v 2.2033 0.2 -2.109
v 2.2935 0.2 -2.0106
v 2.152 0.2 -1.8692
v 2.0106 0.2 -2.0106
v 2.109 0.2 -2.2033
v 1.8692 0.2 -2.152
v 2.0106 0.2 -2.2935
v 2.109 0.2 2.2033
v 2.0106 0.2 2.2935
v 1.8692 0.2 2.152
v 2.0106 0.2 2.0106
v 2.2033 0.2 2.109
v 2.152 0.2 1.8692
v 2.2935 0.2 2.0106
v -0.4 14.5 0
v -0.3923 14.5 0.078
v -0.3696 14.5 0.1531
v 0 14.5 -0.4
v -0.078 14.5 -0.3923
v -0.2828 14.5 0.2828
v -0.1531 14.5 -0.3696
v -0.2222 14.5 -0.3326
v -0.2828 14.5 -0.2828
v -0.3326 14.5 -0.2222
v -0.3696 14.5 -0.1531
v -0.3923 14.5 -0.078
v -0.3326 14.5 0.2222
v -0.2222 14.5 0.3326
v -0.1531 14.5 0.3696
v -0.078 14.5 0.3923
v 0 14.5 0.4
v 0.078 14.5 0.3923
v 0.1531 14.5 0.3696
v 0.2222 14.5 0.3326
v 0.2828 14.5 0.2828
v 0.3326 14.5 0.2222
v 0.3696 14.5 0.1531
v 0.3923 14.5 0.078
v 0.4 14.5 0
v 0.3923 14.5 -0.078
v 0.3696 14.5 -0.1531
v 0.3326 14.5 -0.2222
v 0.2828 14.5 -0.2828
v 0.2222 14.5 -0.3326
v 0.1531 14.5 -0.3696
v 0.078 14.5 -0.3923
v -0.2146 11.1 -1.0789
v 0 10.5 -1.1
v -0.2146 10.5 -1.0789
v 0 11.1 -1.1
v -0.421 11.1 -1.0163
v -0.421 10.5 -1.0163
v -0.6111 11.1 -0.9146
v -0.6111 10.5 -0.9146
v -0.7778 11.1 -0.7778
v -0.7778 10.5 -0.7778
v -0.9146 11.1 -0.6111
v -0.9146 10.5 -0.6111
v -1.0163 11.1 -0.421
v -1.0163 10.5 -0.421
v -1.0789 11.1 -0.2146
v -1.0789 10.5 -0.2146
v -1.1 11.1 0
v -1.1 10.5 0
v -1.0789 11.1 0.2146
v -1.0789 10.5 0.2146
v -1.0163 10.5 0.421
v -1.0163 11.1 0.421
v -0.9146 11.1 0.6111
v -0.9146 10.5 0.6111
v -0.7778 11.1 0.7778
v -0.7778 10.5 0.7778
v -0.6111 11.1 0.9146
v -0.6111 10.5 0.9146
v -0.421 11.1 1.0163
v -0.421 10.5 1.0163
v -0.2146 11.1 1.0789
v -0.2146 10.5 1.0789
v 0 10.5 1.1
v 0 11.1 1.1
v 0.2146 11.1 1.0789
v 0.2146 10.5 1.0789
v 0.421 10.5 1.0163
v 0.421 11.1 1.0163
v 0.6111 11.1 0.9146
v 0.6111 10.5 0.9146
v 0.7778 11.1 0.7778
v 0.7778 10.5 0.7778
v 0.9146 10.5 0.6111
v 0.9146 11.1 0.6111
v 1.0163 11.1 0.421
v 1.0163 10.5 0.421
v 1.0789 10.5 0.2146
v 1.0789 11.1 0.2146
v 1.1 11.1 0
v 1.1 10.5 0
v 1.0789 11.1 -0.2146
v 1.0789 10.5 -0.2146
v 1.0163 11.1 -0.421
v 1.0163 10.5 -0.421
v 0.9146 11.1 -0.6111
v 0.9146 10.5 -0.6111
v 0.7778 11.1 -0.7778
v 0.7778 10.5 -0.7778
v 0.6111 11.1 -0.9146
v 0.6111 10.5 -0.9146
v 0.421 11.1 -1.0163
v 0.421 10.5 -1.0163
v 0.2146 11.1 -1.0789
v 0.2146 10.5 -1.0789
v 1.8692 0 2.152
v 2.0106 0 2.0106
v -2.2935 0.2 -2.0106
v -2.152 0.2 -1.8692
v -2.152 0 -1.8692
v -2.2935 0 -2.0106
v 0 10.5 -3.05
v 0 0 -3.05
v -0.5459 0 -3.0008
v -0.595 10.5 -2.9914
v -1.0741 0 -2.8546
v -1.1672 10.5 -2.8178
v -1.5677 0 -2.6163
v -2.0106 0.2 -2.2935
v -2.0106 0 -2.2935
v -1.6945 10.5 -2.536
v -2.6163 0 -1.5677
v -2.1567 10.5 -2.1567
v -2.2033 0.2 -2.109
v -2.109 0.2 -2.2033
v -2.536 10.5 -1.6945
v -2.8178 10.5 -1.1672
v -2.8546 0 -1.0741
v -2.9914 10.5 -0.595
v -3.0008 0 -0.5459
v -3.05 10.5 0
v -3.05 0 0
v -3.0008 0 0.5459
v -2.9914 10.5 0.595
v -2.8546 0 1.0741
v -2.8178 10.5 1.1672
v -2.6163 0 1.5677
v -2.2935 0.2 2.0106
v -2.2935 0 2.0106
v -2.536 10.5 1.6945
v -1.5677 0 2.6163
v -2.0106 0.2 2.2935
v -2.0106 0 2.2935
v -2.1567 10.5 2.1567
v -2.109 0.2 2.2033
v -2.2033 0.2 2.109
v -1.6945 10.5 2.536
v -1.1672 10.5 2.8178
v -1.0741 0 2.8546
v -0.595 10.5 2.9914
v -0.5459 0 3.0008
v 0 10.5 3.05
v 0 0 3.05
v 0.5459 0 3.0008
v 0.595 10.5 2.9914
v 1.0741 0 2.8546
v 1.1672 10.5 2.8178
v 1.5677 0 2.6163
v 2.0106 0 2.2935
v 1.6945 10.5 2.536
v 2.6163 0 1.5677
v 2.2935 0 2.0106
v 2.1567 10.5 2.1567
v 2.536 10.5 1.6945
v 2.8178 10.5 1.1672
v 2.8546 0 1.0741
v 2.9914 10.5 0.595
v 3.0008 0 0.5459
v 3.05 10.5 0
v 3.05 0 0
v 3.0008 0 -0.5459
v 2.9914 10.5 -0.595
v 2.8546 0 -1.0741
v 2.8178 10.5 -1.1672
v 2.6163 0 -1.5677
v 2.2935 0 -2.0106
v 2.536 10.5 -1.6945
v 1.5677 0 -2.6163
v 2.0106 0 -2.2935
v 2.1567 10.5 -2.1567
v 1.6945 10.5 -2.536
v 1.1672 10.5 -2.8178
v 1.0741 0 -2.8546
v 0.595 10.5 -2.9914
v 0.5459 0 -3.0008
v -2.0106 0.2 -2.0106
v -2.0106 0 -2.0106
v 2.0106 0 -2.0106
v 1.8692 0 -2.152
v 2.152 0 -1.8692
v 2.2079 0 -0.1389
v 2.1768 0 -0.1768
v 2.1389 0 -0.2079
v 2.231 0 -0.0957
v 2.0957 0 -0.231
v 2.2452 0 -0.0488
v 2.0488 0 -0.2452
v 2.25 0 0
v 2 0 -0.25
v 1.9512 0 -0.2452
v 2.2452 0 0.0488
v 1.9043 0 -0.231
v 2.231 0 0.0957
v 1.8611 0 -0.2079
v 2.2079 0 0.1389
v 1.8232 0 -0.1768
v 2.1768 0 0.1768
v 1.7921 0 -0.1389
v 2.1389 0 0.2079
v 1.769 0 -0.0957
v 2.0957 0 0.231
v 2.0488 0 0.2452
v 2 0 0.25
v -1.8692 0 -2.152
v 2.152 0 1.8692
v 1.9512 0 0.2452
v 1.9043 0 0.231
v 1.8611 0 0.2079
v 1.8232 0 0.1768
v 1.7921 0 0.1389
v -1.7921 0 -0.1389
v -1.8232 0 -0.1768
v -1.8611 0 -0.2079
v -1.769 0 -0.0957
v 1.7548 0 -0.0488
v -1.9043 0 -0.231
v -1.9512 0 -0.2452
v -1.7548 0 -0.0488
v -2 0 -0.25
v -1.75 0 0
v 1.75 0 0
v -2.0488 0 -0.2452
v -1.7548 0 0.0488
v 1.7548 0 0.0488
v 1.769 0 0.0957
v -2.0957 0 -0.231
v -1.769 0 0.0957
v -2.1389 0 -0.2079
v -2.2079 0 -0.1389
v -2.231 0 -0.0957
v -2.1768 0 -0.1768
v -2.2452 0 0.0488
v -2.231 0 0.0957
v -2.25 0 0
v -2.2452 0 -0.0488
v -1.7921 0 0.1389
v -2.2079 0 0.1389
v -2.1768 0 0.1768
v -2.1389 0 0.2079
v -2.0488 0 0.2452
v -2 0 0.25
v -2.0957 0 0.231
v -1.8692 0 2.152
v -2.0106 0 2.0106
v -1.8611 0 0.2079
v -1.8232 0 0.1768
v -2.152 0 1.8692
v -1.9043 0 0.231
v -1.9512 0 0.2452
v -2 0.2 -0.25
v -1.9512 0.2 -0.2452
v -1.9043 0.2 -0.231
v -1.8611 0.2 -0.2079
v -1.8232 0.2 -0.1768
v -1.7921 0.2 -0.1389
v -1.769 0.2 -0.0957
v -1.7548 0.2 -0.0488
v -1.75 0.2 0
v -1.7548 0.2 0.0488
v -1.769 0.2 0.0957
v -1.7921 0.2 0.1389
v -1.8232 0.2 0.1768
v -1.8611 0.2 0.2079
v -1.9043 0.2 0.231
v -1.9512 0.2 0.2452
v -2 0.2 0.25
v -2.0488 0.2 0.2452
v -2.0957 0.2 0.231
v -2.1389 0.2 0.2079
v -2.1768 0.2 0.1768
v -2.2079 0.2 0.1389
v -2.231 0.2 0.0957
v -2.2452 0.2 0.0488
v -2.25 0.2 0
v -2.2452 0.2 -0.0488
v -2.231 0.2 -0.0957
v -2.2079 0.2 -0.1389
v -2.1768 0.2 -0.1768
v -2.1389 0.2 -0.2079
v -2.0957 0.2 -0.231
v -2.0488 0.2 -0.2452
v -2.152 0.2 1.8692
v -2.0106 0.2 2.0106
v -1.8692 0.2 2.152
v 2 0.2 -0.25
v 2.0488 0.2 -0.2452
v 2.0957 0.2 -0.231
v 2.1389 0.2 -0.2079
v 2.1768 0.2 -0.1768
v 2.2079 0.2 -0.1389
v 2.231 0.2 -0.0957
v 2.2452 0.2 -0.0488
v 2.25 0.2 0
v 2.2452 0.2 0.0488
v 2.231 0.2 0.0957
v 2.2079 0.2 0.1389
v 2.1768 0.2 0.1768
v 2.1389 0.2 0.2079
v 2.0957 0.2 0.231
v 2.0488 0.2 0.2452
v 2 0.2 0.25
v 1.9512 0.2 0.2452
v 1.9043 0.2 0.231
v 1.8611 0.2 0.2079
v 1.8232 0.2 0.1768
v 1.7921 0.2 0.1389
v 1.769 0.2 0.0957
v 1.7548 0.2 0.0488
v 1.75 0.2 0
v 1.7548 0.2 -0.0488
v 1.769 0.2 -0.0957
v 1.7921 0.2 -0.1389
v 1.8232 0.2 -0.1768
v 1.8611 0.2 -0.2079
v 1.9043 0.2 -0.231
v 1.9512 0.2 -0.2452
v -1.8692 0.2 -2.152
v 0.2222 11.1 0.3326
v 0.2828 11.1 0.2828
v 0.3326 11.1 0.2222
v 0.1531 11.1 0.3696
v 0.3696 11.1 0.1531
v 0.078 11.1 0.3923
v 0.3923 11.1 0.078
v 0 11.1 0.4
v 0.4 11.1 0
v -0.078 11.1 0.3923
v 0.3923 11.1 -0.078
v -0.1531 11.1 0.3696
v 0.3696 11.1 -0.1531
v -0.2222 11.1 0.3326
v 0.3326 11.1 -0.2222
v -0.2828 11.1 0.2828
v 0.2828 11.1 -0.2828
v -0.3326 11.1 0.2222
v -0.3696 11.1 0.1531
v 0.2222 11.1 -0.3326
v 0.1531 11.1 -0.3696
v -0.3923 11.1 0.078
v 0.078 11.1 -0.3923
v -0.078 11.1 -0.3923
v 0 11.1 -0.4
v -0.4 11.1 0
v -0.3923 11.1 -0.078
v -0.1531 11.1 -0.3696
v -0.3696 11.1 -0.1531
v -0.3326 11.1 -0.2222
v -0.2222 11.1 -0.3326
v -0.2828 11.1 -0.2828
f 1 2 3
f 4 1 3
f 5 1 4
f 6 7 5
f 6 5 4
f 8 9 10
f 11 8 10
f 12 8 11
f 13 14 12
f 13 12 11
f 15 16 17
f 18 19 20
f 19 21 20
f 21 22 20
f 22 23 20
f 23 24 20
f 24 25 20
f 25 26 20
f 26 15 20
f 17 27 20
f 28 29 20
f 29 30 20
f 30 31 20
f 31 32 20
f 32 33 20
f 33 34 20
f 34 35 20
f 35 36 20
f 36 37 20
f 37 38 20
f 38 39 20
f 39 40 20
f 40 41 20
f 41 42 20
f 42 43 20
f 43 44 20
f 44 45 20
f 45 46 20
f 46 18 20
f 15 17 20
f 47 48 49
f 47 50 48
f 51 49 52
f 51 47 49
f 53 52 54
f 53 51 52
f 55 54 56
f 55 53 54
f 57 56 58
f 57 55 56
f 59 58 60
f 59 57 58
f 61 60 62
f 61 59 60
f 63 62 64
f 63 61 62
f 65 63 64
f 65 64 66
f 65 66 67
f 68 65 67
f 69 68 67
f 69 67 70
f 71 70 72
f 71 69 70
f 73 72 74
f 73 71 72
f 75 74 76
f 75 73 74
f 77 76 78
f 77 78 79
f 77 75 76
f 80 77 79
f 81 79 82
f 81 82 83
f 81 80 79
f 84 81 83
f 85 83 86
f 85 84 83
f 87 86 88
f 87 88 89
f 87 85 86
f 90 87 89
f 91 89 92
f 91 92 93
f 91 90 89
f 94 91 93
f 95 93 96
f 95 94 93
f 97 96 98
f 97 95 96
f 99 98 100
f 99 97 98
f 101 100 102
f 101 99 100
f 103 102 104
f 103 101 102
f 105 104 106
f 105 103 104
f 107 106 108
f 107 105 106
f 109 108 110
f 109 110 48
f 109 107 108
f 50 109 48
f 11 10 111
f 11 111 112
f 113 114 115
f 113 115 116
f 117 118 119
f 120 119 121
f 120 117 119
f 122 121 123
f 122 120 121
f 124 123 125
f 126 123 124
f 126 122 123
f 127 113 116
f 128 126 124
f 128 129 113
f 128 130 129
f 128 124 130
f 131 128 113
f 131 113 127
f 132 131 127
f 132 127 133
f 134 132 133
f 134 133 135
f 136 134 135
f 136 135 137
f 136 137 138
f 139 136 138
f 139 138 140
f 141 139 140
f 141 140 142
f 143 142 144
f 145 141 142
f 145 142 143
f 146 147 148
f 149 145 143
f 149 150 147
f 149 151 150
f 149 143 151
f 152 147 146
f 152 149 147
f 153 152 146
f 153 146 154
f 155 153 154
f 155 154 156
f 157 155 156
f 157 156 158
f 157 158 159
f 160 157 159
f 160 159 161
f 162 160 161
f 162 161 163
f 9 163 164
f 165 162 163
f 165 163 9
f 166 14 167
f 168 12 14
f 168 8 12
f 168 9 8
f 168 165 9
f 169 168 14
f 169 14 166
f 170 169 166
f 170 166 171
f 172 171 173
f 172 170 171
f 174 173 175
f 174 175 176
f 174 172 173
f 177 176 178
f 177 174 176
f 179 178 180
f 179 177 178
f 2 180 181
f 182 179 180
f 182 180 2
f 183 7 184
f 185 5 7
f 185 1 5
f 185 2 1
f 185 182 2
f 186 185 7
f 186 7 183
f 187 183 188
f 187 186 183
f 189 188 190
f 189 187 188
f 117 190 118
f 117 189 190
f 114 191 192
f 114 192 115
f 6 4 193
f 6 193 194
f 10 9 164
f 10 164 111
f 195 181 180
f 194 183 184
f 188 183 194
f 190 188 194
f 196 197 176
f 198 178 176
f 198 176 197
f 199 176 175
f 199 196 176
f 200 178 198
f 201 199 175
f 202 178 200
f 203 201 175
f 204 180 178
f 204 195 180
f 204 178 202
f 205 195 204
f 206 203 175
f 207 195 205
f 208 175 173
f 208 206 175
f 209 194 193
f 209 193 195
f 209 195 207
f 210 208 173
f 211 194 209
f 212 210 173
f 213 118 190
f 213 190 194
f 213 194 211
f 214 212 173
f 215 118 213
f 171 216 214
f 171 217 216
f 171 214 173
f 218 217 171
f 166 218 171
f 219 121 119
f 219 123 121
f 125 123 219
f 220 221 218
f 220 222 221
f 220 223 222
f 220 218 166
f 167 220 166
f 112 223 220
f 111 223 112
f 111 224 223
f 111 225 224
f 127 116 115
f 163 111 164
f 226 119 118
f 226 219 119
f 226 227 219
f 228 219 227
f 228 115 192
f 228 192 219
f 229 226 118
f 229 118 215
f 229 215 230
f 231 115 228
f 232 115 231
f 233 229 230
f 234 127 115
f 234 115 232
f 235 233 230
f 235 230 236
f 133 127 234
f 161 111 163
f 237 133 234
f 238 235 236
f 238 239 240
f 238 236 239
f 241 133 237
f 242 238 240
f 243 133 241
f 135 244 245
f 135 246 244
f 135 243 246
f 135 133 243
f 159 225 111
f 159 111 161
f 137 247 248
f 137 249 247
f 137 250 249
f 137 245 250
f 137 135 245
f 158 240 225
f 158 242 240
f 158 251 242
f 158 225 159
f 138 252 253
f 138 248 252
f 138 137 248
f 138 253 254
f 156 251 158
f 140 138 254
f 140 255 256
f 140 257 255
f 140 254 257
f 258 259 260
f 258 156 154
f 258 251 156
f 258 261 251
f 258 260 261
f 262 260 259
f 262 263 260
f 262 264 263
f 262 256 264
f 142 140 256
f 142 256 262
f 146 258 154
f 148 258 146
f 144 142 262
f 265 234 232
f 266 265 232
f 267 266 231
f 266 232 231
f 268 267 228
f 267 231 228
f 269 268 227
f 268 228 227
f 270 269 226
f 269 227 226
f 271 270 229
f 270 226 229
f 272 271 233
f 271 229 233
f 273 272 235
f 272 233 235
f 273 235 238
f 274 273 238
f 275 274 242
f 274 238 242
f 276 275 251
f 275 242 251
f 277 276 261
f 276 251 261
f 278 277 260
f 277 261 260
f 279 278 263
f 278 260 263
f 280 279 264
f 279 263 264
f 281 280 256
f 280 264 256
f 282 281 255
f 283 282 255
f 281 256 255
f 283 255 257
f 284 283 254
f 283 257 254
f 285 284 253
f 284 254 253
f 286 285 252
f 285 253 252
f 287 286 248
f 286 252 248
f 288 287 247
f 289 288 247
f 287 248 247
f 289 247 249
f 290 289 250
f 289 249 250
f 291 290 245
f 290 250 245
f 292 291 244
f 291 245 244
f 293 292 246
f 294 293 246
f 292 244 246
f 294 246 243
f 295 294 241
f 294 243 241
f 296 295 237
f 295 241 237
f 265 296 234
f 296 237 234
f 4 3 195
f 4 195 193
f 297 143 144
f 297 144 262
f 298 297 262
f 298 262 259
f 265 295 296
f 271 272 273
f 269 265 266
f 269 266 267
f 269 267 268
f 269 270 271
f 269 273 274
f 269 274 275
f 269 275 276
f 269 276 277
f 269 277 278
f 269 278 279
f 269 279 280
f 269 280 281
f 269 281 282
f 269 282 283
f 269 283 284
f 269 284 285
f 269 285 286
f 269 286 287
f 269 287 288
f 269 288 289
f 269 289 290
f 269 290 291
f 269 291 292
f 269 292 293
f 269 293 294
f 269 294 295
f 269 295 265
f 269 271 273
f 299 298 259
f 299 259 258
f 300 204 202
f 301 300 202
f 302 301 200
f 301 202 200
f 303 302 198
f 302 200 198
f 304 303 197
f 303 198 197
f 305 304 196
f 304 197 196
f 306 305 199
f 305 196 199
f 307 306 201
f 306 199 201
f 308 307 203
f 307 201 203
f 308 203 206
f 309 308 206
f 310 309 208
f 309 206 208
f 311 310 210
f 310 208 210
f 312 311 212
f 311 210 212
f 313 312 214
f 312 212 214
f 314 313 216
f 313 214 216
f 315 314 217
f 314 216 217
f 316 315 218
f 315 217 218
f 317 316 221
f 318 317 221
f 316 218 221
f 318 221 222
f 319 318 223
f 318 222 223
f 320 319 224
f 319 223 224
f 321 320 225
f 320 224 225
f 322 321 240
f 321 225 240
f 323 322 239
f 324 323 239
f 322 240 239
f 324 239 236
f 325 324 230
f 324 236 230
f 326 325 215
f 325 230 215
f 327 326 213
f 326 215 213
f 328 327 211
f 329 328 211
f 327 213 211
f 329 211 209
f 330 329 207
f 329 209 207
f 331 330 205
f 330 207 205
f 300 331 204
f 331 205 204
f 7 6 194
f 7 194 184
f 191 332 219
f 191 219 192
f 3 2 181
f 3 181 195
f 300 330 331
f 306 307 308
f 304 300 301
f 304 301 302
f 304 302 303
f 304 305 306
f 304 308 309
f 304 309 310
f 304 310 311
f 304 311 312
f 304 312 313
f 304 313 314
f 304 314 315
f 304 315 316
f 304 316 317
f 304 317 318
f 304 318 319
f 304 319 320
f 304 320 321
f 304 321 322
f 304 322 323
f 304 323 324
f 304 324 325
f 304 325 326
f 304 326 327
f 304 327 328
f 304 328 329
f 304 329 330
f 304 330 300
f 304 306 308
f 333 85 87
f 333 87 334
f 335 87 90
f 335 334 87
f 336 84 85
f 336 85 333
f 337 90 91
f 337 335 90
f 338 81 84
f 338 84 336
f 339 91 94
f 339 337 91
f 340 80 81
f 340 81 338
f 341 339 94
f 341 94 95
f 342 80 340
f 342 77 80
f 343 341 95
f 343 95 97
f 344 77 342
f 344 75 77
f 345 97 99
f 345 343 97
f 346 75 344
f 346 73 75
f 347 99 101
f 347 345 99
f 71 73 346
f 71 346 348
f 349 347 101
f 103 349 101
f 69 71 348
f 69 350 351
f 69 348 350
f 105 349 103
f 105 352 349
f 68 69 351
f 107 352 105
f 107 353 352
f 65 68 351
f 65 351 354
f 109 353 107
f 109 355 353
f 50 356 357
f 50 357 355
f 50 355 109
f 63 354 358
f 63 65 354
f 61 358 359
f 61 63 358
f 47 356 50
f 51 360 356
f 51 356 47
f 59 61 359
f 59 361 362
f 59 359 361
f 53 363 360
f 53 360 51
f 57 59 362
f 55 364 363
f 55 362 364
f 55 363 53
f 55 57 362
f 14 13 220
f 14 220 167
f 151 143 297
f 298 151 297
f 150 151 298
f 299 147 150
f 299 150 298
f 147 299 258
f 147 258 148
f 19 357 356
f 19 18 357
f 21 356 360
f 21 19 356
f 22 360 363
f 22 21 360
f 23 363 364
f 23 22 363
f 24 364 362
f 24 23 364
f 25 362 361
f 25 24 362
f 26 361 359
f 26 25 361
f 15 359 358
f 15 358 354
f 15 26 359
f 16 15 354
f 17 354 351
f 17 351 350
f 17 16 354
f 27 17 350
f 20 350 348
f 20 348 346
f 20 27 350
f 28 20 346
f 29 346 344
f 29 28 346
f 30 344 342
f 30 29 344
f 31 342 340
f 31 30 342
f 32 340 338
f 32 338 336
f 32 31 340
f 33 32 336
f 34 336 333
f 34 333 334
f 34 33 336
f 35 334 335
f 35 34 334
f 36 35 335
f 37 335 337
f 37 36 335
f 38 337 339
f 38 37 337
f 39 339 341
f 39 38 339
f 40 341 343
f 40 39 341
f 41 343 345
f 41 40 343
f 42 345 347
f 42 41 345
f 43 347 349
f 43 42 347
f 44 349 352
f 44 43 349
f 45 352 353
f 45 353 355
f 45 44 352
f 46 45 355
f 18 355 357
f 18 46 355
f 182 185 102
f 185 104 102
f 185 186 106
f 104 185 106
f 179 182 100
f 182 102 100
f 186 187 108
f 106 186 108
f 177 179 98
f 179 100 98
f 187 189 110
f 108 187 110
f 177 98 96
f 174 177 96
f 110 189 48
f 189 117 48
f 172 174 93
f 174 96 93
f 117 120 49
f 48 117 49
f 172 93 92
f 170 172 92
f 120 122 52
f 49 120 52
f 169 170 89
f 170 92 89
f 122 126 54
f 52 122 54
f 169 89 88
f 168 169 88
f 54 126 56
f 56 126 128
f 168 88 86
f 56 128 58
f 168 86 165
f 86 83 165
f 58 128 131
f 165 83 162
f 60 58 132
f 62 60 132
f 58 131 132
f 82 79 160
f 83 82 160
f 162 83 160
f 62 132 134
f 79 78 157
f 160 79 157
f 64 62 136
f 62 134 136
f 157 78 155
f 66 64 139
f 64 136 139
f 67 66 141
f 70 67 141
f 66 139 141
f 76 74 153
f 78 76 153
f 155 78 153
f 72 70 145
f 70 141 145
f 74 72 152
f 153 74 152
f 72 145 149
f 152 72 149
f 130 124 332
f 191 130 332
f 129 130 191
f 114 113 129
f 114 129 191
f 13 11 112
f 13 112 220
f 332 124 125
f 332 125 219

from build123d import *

# Parameters (mm, degrees)
CUT_EXTRUDE_START        = -0.2
CUT_EXTRUDE_1_DEPTH      = 0.2
PATTERN_CIRCULAR_1_COUNT = 4
SKETCH_2_3_R             = 0.25
CUT_EXTRUDE_2_DEPTH      = 0.2


with BuildPart() as part:
    # 草图1 → 旋转1 (revolve)
    with BuildSketch(Plane(origin=(0, 0, 0), x_dir=(0, 0, -1), z_dir=(1, 0, 0))):
        Polygon((0, 0), (3.05, 0), (3.05, 10.5), (1.1, 10.5), (1.1, 11.1), (0.4, 11.1), (0.4, 14.5), (0, 14.5), align=None)
    revolve(axis=Axis((0, 11.1, 0), (0, 1, 0)))

    # 草图2 → 切除-拉伸1 (cut)
    with BuildSketch(Plane.XZ.offset(CUT_EXTRUDE_START)):
        with BuildLine():
            Line((-2.152033922, 1.869191209), (-2.010612565, 2.010612565))
            Line((-2.010612565, 2.010612565), (-1.869191209, 2.152033922))
            Line((-1.869191209, 2.152033922), (-2.010612565, 2.293455278))
            ThreePointArc((-2.010612565, 2.293455278), (-2.156675683, 2.156675683), (-2.293455278, 2.010612565))
            Line((-2.293455278, 2.010612565), (-2.152033922, 1.869191209))
        make_face()
    cut_extrude_1 = extrude(amount=CUT_EXTRUDE_1_DEPTH, mode=Mode.SUBTRACT)

    # 阵列(圆周)1: 切除-拉伸1 ×4 about axis
    pattern_circular_1_axis = Axis((0, 11.1, 0), (0, -1, 0))
    for i in range(1, PATTERN_CIRCULAR_1_COUNT):
        add(cut_extrude_1.rotate(pattern_circular_1_axis, i * 360 / PATTERN_CIRCULAR_1_COUNT), mode=Mode.SUBTRACT)

    # 草图2<3> → 切除-拉伸2 (cut)
    with BuildSketch(Plane.XZ):
        with Locations((-2, 0)):
            Circle(SKETCH_2_3_R)
        with Locations((2, 0)):
            Circle(SKETCH_2_3_R)
    extrude(amount=-CUT_EXTRUDE_2_DEPTH, mode=Mode.SUBTRACT)


solid = part.part
